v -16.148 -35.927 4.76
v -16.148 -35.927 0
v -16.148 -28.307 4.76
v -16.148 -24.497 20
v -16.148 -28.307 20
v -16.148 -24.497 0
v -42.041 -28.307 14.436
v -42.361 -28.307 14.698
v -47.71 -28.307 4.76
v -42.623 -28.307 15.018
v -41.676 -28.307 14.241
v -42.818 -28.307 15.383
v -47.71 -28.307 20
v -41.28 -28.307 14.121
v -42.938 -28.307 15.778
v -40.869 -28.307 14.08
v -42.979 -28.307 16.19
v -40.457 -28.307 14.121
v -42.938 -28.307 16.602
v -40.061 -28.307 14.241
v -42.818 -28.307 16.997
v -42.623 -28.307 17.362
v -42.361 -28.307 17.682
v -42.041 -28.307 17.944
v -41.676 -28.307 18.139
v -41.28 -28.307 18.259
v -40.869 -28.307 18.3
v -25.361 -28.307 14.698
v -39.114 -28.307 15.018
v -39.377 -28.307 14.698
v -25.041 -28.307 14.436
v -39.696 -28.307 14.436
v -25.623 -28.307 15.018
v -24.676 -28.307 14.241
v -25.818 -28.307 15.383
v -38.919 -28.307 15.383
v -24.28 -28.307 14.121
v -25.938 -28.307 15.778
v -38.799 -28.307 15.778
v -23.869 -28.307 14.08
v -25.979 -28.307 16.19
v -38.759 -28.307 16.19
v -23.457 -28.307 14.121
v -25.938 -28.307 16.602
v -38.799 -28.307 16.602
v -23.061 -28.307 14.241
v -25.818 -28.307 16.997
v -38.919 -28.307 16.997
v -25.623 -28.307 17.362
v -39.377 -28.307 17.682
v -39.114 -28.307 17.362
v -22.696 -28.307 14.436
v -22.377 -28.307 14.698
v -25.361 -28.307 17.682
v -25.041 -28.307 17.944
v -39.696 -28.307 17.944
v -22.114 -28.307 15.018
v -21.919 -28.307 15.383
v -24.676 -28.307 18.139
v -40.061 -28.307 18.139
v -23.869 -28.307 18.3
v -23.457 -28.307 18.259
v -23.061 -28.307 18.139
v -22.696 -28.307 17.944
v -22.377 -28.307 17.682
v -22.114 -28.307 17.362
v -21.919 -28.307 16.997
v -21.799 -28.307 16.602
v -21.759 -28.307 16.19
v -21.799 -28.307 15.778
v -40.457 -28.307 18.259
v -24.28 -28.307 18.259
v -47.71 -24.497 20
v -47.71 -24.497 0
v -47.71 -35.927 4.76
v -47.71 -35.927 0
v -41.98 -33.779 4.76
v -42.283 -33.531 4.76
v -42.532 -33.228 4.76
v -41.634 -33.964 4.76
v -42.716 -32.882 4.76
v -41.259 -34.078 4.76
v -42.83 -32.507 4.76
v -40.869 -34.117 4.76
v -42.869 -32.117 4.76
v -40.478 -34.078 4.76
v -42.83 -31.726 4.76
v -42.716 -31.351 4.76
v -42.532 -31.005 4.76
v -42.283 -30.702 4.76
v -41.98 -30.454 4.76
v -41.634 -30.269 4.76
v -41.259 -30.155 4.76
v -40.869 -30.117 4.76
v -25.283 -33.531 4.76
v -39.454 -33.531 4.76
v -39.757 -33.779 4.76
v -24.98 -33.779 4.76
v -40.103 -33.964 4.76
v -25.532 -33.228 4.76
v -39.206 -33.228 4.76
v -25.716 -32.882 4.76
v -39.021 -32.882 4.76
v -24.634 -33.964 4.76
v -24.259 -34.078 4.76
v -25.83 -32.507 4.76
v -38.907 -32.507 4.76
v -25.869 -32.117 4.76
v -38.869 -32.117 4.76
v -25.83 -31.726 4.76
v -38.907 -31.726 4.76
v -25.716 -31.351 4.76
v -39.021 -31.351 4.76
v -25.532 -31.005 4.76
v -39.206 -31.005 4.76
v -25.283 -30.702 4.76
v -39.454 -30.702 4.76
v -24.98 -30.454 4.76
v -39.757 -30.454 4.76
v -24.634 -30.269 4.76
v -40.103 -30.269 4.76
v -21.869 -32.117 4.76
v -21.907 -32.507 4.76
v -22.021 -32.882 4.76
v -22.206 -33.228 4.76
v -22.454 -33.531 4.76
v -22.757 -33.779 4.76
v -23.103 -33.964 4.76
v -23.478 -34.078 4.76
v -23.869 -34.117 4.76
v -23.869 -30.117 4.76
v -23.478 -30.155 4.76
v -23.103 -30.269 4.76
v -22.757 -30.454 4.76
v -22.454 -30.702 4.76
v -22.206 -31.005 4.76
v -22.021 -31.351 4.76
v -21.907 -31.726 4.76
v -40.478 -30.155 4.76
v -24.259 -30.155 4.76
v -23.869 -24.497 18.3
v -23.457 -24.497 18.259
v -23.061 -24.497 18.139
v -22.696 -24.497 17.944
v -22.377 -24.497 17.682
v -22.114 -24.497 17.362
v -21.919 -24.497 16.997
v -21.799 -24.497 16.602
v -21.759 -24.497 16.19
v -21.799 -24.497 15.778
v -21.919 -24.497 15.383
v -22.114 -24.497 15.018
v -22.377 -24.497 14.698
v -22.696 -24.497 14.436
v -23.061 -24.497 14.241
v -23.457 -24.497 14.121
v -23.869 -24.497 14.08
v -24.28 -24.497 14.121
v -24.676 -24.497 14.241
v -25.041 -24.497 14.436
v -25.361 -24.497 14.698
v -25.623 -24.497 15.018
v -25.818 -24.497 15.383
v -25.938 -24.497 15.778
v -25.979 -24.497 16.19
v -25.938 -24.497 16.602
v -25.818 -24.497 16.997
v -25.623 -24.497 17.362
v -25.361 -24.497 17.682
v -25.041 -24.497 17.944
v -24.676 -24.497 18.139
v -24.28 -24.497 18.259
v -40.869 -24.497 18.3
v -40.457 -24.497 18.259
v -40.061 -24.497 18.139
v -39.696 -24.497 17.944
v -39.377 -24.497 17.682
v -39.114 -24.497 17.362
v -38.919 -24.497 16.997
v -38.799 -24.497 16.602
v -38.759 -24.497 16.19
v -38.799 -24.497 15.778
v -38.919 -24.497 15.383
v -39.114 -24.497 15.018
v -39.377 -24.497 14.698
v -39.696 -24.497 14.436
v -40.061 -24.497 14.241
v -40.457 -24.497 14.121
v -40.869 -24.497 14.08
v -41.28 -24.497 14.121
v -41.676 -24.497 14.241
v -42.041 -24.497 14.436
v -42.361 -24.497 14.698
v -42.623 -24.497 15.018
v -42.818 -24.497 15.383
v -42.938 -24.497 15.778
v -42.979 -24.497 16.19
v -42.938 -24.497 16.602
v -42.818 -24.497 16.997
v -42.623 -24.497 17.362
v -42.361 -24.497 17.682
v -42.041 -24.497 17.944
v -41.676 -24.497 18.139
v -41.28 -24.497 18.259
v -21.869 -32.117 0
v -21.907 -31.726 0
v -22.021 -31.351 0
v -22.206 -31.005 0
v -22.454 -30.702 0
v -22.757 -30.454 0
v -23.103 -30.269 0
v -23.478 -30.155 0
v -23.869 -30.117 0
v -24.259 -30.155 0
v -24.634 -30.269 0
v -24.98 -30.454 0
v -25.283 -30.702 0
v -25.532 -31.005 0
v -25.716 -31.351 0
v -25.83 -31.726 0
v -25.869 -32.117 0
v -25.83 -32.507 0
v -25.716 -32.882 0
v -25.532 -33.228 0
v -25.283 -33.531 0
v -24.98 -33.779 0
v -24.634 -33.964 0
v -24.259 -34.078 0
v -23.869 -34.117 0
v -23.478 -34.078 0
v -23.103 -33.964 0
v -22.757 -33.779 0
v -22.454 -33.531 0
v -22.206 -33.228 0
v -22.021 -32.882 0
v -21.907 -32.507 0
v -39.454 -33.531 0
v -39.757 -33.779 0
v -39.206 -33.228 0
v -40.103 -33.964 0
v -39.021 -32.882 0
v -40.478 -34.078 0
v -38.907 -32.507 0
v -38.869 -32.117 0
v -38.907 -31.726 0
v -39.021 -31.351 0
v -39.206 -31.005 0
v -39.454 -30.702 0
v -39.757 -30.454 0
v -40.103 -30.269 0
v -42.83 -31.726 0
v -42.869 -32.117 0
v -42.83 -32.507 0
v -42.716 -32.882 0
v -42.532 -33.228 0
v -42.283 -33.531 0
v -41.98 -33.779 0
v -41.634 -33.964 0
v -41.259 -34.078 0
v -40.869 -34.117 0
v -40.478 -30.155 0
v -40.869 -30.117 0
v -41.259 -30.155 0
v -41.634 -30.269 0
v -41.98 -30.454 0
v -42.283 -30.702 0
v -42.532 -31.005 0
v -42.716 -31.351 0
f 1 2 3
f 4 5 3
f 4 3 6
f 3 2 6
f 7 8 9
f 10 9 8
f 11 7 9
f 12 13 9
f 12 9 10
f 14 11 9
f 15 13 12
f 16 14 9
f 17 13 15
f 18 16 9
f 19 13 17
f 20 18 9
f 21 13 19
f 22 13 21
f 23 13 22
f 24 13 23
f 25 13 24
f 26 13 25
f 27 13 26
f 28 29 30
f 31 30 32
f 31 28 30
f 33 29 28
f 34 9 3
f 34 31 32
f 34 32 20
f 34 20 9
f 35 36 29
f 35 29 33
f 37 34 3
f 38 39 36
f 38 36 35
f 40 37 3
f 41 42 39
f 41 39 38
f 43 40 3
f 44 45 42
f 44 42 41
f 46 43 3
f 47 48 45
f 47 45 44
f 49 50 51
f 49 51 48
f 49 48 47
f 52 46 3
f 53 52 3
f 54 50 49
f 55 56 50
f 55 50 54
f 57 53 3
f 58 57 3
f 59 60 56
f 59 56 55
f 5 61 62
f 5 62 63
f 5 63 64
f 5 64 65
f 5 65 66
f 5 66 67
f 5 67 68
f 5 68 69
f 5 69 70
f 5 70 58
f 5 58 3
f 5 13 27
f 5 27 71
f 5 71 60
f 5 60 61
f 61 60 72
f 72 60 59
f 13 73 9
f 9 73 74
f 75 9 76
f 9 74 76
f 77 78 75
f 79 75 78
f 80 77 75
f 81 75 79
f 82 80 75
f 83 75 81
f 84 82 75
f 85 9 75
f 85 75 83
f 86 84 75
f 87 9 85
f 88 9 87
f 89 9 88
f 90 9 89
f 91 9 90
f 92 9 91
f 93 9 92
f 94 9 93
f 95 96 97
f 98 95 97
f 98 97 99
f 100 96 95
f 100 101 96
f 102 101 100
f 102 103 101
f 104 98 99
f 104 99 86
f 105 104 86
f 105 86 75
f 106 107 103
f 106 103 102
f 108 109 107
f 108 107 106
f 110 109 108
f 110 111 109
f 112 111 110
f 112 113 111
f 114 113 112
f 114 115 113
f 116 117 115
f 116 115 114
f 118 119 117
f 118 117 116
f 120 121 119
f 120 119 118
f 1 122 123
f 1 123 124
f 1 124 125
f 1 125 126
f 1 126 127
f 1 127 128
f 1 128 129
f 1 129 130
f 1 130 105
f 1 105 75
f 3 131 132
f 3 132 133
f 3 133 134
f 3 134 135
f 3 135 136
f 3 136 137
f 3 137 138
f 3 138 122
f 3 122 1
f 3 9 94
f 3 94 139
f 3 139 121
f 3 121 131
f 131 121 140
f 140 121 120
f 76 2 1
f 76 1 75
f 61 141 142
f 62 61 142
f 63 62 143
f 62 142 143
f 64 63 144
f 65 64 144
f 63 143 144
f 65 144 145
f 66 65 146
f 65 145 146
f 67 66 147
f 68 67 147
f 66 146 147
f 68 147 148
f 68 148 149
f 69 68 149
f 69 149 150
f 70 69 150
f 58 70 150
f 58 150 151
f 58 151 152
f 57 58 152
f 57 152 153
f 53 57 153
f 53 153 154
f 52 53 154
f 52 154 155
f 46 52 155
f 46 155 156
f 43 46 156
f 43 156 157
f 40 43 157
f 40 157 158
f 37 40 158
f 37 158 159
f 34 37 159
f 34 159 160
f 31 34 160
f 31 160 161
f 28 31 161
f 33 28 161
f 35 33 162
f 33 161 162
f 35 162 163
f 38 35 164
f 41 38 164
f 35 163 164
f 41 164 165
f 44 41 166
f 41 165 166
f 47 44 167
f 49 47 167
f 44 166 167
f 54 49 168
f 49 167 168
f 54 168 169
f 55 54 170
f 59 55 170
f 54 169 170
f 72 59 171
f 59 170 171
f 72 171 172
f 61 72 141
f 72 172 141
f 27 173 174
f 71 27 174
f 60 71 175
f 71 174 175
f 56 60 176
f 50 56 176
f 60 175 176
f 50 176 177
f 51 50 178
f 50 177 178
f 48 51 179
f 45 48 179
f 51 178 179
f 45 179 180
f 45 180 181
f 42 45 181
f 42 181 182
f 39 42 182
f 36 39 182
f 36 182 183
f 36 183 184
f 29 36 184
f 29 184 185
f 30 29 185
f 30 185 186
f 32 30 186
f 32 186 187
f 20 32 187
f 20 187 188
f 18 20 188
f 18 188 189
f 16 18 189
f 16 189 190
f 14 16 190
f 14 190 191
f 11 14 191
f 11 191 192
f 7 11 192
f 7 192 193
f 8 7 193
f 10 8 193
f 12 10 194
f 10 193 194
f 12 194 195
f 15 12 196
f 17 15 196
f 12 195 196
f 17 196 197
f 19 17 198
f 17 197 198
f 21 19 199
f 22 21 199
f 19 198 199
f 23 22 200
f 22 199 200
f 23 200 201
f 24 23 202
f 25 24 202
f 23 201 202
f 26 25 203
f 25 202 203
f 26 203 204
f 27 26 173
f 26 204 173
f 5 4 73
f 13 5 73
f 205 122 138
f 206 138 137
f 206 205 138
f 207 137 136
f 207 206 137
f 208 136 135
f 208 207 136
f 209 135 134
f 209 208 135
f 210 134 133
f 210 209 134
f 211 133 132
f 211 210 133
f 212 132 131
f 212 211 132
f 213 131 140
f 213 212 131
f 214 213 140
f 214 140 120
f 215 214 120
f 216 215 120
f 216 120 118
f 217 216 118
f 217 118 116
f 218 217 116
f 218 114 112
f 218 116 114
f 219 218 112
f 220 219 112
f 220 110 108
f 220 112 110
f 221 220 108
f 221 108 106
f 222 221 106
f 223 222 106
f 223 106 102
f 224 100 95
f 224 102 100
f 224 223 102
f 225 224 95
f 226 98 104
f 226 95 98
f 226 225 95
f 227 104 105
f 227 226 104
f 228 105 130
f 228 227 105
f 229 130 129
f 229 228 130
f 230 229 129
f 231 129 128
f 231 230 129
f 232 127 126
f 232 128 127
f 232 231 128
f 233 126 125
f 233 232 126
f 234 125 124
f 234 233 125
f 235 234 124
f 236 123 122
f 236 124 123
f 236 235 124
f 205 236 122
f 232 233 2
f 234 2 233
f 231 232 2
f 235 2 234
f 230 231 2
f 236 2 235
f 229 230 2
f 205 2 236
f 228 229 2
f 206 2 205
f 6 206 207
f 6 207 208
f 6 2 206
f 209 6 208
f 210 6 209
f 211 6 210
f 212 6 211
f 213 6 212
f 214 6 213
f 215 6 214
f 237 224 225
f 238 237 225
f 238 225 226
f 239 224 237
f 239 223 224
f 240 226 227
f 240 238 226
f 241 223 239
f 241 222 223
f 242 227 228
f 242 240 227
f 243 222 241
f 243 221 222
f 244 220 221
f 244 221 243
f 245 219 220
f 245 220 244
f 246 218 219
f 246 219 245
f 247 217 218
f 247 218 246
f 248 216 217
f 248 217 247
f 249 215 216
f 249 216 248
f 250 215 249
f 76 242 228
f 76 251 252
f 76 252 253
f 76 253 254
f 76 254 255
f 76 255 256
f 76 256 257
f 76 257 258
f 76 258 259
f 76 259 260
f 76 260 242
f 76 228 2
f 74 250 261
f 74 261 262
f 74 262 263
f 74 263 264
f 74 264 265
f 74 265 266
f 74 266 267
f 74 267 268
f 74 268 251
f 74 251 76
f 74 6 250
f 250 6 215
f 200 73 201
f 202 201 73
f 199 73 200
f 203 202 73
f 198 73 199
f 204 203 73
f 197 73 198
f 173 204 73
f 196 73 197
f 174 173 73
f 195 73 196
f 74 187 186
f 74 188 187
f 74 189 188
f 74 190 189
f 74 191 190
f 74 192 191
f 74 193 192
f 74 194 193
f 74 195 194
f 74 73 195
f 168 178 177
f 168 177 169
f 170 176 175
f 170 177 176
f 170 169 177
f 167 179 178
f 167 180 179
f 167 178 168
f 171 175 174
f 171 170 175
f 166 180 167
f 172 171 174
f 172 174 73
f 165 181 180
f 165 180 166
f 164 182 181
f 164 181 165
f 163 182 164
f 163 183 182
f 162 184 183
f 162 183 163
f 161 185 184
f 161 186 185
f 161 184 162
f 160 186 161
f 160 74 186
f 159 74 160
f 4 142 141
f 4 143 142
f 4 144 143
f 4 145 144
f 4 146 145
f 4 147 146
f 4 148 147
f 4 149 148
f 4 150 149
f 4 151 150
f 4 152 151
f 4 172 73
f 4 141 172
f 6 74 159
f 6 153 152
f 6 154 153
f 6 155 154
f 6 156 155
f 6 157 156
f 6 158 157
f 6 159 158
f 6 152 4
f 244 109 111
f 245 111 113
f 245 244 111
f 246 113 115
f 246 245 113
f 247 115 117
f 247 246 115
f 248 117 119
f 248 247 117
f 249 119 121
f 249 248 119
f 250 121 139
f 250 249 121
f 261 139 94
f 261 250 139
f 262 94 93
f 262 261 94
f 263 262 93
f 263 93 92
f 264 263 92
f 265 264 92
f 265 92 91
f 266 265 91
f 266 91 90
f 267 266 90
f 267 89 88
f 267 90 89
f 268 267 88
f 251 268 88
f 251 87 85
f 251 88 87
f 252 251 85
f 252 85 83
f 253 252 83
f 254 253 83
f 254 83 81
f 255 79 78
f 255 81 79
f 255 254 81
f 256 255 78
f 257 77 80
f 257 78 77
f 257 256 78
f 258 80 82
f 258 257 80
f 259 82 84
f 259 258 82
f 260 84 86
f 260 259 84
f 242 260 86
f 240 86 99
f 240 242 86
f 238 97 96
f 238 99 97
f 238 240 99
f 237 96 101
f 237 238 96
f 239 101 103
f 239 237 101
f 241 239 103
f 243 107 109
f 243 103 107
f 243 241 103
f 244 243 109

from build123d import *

# Parameters (mm, degrees)
SKETCH1_R           = 2
BOSS_EXTRUDE1_DEPTH = 20
SKETCH2_W           = 31.562668847
SKETCH2_H           = 7.62
CUT_EXTRUDE1_DEPTH  = 15.24
SKETCH5_R           = 2.11
CUT_EXTRUDE2_DEPTH  = 10.414


with BuildPart() as part:
    # Sketch1 → Boss-Extrude1 (new body)
    with BuildSketch(Plane.XY):
        Polygon((-16.147505616, -28.306513497), (-16.147505616, -35.926513497), (-47.710174463, -35.926513497), (-47.710174463, -28.306513497), (-47.710174463, -24.496513497), (-16.147505616, -24.496513497), align=None)
        with Locations((-40.868568225, -32.116513497)):
            Circle(SKETCH1_R, mode=Mode.SUBTRACT)
        with Locations((-23.868568225, -32.116530453)):
            Circle(SKETCH1_R, mode=Mode.SUBTRACT)
    extrude(amount=BOSS_EXTRUDE1_DEPTH)

    # Sketch2 → Cut-Extrude1 (cut)
    with BuildSketch(Plane.XY.offset(20)):
        with Locations((-31.92884004, -32.116513497)):
            Rectangle(SKETCH2_W, SKETCH2_H)
    extrude(amount=-CUT_EXTRUDE1_DEPTH, mode=Mode.SUBTRACT)

    # Sketch5 → Cut-Extrude2 (cut)
    with BuildSketch(Plane(origin=(0, -24.496513497, 0), x_dir=(1, 0, 0), z_dir=(0, 1, 0))):
        with Locations(Location((-23.868568225, -16.19, 0), (0, 0, 270))):
            Circle(SKETCH5_R)
        with Locations(Location((-40.868568225, -16.19, 0), (0, 0, 270))):
            Circle(SKETCH5_R)
    extrude(amount=-CUT_EXTRUDE2_DEPTH, mode=Mode.SUBTRACT)


solid = part.part
